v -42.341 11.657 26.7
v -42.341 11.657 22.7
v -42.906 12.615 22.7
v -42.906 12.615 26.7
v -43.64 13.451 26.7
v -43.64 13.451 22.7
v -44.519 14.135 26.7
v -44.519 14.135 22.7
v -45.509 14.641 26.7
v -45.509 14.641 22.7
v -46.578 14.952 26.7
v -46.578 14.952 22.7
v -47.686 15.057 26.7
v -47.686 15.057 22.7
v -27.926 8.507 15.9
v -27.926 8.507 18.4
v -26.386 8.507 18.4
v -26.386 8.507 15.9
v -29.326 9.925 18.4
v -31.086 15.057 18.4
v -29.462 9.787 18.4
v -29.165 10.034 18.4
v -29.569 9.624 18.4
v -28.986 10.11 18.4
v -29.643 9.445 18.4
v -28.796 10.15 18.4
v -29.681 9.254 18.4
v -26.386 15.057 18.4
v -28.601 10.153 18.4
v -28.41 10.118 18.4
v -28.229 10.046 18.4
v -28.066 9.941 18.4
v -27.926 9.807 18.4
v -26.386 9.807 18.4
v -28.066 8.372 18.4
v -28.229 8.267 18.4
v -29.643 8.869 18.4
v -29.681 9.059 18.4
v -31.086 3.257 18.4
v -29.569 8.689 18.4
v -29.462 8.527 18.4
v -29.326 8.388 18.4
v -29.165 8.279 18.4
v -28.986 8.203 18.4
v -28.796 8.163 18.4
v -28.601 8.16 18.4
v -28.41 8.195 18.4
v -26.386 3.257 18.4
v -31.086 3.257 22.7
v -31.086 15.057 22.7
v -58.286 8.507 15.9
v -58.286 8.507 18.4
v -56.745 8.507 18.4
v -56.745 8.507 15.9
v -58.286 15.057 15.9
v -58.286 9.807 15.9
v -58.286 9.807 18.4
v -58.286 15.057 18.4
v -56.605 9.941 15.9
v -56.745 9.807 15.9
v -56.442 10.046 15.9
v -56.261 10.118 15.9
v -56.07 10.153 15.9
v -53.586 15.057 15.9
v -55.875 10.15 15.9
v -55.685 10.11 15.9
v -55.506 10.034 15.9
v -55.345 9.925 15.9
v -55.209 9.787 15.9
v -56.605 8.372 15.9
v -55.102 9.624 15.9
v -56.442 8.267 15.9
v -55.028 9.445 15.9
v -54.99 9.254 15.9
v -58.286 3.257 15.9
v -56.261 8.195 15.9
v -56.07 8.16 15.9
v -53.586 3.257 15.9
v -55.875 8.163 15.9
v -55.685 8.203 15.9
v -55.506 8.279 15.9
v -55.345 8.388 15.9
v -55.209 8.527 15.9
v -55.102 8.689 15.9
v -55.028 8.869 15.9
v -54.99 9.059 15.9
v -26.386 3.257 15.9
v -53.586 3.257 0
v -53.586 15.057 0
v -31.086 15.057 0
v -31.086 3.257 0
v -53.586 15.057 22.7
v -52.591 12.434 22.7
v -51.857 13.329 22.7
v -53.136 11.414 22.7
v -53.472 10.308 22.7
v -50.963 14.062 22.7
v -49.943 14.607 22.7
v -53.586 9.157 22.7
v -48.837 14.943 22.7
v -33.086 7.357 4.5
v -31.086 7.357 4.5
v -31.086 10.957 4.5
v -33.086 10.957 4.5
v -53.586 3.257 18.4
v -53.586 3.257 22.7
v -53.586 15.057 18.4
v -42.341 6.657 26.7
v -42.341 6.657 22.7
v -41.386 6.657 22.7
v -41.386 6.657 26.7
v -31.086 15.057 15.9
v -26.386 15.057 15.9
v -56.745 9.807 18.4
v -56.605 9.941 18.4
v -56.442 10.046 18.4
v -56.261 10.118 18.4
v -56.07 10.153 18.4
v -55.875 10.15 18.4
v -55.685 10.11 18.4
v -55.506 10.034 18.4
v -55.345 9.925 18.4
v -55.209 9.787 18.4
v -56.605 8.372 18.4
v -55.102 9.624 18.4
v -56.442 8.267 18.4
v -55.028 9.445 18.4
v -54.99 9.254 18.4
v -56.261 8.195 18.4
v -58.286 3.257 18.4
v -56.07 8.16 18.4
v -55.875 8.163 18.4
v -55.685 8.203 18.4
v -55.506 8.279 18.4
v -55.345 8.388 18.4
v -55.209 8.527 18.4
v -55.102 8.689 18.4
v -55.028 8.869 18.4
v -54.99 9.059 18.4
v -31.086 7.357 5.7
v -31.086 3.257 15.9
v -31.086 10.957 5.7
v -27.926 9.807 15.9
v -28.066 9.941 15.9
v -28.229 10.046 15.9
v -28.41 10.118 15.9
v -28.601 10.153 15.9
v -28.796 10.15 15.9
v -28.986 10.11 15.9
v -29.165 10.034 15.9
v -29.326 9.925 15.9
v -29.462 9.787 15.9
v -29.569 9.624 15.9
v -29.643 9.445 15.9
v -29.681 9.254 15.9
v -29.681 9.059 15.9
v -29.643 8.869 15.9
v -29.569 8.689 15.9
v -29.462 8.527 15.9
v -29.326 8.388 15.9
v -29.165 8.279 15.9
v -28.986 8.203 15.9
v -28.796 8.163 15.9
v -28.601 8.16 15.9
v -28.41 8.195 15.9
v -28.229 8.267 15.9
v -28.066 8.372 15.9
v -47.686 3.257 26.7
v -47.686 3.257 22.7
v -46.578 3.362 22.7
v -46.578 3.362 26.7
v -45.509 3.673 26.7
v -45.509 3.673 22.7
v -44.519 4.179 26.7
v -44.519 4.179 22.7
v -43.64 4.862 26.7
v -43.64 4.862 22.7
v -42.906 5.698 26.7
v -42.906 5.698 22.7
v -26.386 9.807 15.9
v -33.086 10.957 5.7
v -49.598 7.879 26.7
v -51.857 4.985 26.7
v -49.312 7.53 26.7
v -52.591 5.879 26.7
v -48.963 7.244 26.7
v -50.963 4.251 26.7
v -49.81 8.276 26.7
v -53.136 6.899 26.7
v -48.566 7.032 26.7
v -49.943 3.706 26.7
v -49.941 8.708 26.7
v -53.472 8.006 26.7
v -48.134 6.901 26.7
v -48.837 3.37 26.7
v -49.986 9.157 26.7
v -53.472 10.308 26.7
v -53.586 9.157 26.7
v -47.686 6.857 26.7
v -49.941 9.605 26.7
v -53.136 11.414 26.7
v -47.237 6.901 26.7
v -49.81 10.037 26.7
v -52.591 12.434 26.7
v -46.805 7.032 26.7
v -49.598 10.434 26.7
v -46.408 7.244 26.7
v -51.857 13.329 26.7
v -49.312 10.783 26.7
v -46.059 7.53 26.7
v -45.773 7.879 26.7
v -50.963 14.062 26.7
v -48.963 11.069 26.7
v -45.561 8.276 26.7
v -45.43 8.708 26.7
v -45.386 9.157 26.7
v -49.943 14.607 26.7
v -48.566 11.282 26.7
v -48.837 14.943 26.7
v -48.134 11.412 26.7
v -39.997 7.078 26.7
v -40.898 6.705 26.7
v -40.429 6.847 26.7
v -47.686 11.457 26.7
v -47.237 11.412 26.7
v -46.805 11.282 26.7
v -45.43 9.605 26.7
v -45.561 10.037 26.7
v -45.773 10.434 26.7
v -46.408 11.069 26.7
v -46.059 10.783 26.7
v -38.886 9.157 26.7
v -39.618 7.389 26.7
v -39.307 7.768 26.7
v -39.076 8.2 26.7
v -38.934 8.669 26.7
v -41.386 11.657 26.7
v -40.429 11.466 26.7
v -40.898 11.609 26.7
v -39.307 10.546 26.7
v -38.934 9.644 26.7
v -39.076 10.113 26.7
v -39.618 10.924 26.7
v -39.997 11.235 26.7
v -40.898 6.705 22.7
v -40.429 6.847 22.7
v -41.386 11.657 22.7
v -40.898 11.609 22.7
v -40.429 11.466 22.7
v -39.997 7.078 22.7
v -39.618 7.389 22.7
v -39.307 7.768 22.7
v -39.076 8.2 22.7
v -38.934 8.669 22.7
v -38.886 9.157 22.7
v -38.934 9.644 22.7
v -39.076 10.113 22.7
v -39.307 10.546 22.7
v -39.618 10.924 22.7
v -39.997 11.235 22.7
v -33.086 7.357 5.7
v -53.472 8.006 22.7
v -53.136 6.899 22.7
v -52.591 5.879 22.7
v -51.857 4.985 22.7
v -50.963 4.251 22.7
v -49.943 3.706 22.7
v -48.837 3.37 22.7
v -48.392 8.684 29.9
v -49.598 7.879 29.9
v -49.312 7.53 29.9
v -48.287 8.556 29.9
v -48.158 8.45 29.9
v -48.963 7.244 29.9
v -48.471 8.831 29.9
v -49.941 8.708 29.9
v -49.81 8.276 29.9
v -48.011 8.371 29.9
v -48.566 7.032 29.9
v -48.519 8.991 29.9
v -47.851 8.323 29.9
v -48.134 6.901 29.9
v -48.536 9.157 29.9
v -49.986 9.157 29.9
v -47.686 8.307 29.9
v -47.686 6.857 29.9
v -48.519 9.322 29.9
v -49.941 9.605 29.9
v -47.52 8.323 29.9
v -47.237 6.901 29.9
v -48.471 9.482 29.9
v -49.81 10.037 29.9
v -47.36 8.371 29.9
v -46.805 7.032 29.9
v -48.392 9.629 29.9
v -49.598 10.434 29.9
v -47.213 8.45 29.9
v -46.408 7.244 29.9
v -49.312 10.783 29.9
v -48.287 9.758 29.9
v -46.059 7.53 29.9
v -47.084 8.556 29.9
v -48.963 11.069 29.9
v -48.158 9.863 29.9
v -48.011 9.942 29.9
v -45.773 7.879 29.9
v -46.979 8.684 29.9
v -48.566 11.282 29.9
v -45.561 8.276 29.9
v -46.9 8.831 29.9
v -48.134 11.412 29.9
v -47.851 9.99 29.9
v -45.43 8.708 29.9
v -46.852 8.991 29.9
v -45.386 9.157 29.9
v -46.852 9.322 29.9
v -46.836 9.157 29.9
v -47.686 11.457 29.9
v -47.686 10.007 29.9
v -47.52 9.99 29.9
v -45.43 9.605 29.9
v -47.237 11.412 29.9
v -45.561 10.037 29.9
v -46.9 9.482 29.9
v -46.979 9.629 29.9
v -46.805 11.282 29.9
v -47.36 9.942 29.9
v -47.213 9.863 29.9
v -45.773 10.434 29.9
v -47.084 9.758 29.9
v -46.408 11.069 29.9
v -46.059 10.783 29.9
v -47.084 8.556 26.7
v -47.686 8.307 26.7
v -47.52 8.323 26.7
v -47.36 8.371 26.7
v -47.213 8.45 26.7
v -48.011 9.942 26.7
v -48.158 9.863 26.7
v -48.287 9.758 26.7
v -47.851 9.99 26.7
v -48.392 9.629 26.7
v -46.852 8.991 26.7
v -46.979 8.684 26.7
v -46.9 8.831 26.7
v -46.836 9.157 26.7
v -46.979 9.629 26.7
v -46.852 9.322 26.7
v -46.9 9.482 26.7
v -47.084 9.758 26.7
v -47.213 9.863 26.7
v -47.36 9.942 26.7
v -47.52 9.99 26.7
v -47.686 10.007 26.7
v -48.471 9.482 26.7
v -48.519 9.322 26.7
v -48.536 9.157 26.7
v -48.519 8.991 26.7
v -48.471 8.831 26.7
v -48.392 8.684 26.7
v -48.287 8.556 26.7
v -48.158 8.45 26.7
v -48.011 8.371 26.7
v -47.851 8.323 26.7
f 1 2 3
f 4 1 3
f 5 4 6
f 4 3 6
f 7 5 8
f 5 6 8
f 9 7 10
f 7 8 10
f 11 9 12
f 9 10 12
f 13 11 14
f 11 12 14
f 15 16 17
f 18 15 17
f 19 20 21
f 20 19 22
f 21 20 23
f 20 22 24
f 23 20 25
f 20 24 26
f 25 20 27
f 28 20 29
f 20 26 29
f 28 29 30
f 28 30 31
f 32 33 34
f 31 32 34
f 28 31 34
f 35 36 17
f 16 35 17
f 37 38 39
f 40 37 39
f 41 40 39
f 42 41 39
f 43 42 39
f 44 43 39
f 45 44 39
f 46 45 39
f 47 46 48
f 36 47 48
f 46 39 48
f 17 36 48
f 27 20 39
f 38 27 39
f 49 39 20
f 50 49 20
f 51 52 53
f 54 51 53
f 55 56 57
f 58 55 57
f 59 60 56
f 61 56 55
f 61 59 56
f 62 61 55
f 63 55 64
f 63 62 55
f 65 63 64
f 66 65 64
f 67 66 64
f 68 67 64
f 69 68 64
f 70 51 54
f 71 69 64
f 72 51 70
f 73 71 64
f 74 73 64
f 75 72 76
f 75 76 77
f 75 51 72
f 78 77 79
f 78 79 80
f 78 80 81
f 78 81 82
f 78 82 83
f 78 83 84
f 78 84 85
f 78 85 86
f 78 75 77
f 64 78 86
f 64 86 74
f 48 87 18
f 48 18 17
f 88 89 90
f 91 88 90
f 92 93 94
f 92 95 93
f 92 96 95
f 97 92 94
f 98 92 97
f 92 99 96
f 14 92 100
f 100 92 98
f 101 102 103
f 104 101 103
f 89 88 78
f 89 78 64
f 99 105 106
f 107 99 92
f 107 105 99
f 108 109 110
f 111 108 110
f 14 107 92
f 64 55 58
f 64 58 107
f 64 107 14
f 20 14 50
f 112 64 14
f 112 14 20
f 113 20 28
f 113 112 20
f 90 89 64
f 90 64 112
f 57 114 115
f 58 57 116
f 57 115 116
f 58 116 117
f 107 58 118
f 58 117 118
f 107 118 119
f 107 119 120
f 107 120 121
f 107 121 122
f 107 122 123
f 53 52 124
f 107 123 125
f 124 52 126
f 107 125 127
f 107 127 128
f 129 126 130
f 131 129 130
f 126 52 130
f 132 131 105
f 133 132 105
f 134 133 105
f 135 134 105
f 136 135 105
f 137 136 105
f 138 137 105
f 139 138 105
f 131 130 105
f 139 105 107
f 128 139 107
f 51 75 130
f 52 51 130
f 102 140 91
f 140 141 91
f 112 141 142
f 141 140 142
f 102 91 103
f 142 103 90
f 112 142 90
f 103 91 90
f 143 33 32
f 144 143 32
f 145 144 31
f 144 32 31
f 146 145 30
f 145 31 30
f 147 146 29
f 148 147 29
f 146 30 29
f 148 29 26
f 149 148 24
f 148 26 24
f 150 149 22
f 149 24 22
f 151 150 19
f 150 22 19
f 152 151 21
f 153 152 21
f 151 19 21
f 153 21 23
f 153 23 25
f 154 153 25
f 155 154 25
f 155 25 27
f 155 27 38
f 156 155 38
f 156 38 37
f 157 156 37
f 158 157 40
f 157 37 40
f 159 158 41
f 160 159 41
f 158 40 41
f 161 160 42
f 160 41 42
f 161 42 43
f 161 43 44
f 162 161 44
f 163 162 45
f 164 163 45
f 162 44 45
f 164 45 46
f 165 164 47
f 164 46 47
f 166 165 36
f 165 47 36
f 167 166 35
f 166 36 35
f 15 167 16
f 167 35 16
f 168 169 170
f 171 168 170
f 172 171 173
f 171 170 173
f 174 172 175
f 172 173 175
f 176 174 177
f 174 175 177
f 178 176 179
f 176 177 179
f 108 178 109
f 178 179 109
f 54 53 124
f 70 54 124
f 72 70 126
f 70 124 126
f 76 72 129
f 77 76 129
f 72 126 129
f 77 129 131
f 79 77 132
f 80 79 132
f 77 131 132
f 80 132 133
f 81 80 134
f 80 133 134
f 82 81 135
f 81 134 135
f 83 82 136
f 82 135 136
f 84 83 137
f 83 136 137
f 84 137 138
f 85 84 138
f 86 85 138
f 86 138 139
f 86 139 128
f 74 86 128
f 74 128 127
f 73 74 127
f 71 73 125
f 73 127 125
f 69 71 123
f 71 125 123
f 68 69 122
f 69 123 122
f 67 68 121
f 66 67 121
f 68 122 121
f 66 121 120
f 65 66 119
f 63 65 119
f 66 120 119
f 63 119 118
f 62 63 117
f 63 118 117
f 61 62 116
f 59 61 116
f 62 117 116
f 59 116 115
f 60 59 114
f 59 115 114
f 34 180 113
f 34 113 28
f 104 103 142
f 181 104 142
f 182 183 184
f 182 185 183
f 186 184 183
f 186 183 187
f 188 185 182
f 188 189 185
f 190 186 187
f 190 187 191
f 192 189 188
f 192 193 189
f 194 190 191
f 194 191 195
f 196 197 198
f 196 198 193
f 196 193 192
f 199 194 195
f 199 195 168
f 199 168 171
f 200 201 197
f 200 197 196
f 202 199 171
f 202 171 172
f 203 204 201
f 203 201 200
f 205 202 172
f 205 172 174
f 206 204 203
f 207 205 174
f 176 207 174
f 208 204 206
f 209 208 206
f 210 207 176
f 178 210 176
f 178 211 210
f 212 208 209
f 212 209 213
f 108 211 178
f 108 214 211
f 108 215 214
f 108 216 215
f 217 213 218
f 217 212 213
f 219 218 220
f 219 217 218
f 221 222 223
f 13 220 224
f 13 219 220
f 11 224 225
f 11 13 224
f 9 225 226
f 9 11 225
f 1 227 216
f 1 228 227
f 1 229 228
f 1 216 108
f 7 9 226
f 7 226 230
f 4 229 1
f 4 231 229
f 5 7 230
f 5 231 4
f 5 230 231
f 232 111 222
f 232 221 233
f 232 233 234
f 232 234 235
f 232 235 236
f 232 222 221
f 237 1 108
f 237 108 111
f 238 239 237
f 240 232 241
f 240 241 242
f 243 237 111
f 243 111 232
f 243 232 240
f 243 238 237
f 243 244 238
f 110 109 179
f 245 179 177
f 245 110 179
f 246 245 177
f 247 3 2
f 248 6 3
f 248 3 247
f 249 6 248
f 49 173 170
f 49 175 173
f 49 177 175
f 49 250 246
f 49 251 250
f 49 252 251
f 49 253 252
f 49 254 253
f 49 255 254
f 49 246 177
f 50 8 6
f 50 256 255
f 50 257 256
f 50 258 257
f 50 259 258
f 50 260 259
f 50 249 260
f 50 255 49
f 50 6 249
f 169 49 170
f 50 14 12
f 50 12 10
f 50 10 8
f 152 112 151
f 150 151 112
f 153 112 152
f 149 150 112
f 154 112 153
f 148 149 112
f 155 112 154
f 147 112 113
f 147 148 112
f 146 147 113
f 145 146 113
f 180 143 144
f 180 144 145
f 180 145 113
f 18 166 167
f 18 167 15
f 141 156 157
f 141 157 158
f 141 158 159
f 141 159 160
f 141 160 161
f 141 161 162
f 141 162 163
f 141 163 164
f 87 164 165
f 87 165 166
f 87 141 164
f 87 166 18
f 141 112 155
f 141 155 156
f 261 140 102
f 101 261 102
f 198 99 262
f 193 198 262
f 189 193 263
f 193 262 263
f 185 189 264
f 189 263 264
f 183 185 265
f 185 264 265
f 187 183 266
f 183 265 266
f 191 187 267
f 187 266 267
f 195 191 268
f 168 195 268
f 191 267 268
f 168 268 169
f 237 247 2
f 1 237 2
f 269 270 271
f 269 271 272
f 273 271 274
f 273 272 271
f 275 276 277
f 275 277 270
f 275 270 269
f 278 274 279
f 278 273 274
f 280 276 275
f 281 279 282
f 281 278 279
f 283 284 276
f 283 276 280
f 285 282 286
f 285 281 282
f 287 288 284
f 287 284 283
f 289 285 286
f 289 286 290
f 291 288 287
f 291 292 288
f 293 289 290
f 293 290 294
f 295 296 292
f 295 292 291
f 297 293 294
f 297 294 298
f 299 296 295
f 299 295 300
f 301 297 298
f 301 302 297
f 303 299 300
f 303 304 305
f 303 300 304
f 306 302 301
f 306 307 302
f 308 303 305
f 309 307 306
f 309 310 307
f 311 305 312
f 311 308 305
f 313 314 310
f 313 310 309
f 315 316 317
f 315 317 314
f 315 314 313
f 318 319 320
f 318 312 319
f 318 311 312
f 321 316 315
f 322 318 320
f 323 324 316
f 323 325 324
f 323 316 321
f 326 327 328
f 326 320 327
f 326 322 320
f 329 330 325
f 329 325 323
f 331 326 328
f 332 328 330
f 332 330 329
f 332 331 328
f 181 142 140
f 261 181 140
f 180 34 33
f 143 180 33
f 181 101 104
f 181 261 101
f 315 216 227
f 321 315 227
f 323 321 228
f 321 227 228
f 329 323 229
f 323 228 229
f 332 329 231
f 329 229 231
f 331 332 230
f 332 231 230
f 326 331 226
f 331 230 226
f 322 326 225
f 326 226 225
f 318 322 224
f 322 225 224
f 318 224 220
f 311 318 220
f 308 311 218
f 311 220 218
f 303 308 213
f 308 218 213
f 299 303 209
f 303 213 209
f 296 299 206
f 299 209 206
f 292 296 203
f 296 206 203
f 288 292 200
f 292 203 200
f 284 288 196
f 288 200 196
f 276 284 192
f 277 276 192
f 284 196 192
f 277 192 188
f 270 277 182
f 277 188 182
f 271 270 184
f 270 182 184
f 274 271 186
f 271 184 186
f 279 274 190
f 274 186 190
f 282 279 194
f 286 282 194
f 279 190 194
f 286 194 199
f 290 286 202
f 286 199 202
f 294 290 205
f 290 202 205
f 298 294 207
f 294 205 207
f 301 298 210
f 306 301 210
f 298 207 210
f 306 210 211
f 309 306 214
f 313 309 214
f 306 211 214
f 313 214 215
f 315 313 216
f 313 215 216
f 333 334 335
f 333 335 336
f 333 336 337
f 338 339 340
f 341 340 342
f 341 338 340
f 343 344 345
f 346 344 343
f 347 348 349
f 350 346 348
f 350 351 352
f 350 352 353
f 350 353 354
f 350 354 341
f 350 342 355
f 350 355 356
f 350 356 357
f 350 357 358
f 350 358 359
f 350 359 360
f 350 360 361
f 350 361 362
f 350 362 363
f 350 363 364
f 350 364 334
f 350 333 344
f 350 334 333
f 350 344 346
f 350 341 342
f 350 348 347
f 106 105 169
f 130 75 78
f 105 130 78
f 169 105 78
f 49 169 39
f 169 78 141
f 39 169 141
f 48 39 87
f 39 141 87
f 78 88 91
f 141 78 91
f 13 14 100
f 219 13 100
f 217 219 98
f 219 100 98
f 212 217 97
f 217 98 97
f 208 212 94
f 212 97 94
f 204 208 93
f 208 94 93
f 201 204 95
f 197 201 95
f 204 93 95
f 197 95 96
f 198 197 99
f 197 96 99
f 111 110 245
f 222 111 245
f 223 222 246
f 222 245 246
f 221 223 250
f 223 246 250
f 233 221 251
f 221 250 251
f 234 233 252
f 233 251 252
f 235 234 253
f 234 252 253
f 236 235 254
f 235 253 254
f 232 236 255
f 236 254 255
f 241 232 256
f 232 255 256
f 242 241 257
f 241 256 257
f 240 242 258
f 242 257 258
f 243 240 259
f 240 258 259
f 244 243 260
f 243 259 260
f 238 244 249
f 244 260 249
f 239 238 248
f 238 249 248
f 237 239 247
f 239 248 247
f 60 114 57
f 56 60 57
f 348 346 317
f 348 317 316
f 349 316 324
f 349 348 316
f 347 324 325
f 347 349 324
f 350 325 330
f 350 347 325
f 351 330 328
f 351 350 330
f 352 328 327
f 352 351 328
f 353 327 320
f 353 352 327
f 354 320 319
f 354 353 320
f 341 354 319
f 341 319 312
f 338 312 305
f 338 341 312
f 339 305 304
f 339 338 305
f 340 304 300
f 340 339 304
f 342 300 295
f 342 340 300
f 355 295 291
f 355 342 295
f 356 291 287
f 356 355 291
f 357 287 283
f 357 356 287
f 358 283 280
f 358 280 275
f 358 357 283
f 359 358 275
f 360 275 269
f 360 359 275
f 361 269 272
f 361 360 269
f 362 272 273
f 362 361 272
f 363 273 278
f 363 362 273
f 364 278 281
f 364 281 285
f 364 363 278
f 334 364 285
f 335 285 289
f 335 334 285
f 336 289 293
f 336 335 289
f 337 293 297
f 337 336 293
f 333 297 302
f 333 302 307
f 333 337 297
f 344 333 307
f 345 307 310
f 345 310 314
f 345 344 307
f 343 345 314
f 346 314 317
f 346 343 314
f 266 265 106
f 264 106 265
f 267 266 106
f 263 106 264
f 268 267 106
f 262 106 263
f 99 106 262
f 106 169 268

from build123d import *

# Parameters (mm, degrees)
F0_W      = 22.5
F0_H      = 11.8
F1_DEPTH  = 22.7
F2_W      = 4.7
F2_H      = 2.5
F3_DEPTH  = 11.8
F5_DEPTH  = 2.5
F7_DEPTH  = 2.5
F9_DEPTH  = 4
F10_R     = 2.3
F10_R_2   = 0.85
F11_DEPTH = 3.2
F13_DEPTH = 2


with BuildPart() as f1:
    # F0 (on Top) → F1 (new body)
    with BuildSketch(Plane.XY):
        with Locations((-42.3355284333, 9.1565789297)):
            Rectangle(F0_W, F0_H)
    extrude(amount=F1_DEPTH)

    # F2 (on face) → F3 (join)
    with BuildSketch(Plane.XZ.offset(-3.2565789297)):
        with Locations((-55.9355284333, 17.15)):
            Rectangle(F2_W, F2_H)
        with Locations((-28.7355284333, 17.15)):
            Rectangle(F2_W, F2_H)
    extrude(amount=-F3_DEPTH)

    # F4 (on face) → F5 (cut)
    with BuildSketch(Plane.XY.offset(18.4)):
        with BuildLine():
            Line((-58.2855284333, 8.5065789297), (-56.745462641, 8.5065789297))
            ThreePointArc((-56.745462641, 8.5065789297), (-54.9855284333, 9.1565789297), (-56.745462641, 9.8065789297))
            Line((-56.745462641, 9.8065789297), (-58.2855284333, 9.8065789297))
            Line((-58.2855284333, 9.8065789297), (-58.2855284333, 9.1565789297))
            Line((-58.2855284333, 9.1565789297), (-58.2855284333, 8.5065789297))
        make_face()
    extrude(amount=-F5_DEPTH, mode=Mode.SUBTRACT)

    # F6 (on face) → F7 (cut)
    with BuildSketch(Plane.XY.offset(18.4)):
        with BuildLine():
            Line((-26.3855284333, 9.8065789297), (-27.9255942256, 9.8065789297))
            ThreePointArc((-27.9255942256, 9.8065789297), (-29.6855284333, 9.1565789297), (-27.9255942256, 8.5065789297))
            Line((-27.9255942256, 8.5065789297), (-26.3855284333, 8.5065789297))
            Line((-26.3855284333, 8.5065789297), (-26.3855284333, 9.1565789297))
            Line((-26.3855284333, 9.1565789297), (-26.3855284333, 9.8065789297))
        make_face()
    extrude(amount=-F7_DEPTH, mode=Mode.SUBTRACT)

    # F8 (on face) → F9 (join)
    with BuildSketch(Plane.XY.offset(22.7)):
        with BuildLine():
            Line((-41.3855284333, 11.6565789297), (-42.341372747, 11.6565789297))
            ThreePointArc((-42.341372747, 11.6565789297), (-44.5185109103, 14.1345303165), (-47.6855284366, 15.0565789297))
            ThreePointArc((-47.6855284366, 15.0565789297), (-51.8574584435, 13.3285089376), (-53.5855284333, 9.1565789297))
            ThreePointArc((-53.5855284333, 9.1565789297), (-51.8574584423, 4.9846489207), (-47.6855284333, 3.2565789297))
            ThreePointArc((-47.6855284333, 3.2565789297), (-44.5185109089, 4.1786275439), (-42.341372747, 6.6565789297))
            Line((-42.341372747, 6.6565789297), (-41.3855284333, 6.6565789297))
            ThreePointArc((-41.3855284333, 6.6565789297), (-38.8855284333, 9.1565789297), (-41.3855284333, 11.6565789297))
        make_face()
    extrude(amount=F9_DEPTH)

    # F10 (on face) → F11 (join)
    with BuildSketch(Plane.XY.offset(26.7)):
        with Locations((-47.6855284333, 9.1565789297)):
            Circle(F10_R)
        with Locations((-47.6855284333, 9.1565789297)):
            Circle(F10_R_2, mode=Mode.SUBTRACT)
    extrude(amount=F11_DEPTH)

    # F12 (on face) → F13 (cut)
    with BuildSketch(Plane.YZ.offset(-31.0855284333)):
        Polygon((7.3565789297, 4.5), (9.1565789297, 4.5), (10.9565789297, 4.5), (10.9565789297, 5.7), (7.3565789297, 5.7), align=None)
    extrude(amount=-F13_DEPTH, mode=Mode.SUBTRACT)


solid = f1.part
